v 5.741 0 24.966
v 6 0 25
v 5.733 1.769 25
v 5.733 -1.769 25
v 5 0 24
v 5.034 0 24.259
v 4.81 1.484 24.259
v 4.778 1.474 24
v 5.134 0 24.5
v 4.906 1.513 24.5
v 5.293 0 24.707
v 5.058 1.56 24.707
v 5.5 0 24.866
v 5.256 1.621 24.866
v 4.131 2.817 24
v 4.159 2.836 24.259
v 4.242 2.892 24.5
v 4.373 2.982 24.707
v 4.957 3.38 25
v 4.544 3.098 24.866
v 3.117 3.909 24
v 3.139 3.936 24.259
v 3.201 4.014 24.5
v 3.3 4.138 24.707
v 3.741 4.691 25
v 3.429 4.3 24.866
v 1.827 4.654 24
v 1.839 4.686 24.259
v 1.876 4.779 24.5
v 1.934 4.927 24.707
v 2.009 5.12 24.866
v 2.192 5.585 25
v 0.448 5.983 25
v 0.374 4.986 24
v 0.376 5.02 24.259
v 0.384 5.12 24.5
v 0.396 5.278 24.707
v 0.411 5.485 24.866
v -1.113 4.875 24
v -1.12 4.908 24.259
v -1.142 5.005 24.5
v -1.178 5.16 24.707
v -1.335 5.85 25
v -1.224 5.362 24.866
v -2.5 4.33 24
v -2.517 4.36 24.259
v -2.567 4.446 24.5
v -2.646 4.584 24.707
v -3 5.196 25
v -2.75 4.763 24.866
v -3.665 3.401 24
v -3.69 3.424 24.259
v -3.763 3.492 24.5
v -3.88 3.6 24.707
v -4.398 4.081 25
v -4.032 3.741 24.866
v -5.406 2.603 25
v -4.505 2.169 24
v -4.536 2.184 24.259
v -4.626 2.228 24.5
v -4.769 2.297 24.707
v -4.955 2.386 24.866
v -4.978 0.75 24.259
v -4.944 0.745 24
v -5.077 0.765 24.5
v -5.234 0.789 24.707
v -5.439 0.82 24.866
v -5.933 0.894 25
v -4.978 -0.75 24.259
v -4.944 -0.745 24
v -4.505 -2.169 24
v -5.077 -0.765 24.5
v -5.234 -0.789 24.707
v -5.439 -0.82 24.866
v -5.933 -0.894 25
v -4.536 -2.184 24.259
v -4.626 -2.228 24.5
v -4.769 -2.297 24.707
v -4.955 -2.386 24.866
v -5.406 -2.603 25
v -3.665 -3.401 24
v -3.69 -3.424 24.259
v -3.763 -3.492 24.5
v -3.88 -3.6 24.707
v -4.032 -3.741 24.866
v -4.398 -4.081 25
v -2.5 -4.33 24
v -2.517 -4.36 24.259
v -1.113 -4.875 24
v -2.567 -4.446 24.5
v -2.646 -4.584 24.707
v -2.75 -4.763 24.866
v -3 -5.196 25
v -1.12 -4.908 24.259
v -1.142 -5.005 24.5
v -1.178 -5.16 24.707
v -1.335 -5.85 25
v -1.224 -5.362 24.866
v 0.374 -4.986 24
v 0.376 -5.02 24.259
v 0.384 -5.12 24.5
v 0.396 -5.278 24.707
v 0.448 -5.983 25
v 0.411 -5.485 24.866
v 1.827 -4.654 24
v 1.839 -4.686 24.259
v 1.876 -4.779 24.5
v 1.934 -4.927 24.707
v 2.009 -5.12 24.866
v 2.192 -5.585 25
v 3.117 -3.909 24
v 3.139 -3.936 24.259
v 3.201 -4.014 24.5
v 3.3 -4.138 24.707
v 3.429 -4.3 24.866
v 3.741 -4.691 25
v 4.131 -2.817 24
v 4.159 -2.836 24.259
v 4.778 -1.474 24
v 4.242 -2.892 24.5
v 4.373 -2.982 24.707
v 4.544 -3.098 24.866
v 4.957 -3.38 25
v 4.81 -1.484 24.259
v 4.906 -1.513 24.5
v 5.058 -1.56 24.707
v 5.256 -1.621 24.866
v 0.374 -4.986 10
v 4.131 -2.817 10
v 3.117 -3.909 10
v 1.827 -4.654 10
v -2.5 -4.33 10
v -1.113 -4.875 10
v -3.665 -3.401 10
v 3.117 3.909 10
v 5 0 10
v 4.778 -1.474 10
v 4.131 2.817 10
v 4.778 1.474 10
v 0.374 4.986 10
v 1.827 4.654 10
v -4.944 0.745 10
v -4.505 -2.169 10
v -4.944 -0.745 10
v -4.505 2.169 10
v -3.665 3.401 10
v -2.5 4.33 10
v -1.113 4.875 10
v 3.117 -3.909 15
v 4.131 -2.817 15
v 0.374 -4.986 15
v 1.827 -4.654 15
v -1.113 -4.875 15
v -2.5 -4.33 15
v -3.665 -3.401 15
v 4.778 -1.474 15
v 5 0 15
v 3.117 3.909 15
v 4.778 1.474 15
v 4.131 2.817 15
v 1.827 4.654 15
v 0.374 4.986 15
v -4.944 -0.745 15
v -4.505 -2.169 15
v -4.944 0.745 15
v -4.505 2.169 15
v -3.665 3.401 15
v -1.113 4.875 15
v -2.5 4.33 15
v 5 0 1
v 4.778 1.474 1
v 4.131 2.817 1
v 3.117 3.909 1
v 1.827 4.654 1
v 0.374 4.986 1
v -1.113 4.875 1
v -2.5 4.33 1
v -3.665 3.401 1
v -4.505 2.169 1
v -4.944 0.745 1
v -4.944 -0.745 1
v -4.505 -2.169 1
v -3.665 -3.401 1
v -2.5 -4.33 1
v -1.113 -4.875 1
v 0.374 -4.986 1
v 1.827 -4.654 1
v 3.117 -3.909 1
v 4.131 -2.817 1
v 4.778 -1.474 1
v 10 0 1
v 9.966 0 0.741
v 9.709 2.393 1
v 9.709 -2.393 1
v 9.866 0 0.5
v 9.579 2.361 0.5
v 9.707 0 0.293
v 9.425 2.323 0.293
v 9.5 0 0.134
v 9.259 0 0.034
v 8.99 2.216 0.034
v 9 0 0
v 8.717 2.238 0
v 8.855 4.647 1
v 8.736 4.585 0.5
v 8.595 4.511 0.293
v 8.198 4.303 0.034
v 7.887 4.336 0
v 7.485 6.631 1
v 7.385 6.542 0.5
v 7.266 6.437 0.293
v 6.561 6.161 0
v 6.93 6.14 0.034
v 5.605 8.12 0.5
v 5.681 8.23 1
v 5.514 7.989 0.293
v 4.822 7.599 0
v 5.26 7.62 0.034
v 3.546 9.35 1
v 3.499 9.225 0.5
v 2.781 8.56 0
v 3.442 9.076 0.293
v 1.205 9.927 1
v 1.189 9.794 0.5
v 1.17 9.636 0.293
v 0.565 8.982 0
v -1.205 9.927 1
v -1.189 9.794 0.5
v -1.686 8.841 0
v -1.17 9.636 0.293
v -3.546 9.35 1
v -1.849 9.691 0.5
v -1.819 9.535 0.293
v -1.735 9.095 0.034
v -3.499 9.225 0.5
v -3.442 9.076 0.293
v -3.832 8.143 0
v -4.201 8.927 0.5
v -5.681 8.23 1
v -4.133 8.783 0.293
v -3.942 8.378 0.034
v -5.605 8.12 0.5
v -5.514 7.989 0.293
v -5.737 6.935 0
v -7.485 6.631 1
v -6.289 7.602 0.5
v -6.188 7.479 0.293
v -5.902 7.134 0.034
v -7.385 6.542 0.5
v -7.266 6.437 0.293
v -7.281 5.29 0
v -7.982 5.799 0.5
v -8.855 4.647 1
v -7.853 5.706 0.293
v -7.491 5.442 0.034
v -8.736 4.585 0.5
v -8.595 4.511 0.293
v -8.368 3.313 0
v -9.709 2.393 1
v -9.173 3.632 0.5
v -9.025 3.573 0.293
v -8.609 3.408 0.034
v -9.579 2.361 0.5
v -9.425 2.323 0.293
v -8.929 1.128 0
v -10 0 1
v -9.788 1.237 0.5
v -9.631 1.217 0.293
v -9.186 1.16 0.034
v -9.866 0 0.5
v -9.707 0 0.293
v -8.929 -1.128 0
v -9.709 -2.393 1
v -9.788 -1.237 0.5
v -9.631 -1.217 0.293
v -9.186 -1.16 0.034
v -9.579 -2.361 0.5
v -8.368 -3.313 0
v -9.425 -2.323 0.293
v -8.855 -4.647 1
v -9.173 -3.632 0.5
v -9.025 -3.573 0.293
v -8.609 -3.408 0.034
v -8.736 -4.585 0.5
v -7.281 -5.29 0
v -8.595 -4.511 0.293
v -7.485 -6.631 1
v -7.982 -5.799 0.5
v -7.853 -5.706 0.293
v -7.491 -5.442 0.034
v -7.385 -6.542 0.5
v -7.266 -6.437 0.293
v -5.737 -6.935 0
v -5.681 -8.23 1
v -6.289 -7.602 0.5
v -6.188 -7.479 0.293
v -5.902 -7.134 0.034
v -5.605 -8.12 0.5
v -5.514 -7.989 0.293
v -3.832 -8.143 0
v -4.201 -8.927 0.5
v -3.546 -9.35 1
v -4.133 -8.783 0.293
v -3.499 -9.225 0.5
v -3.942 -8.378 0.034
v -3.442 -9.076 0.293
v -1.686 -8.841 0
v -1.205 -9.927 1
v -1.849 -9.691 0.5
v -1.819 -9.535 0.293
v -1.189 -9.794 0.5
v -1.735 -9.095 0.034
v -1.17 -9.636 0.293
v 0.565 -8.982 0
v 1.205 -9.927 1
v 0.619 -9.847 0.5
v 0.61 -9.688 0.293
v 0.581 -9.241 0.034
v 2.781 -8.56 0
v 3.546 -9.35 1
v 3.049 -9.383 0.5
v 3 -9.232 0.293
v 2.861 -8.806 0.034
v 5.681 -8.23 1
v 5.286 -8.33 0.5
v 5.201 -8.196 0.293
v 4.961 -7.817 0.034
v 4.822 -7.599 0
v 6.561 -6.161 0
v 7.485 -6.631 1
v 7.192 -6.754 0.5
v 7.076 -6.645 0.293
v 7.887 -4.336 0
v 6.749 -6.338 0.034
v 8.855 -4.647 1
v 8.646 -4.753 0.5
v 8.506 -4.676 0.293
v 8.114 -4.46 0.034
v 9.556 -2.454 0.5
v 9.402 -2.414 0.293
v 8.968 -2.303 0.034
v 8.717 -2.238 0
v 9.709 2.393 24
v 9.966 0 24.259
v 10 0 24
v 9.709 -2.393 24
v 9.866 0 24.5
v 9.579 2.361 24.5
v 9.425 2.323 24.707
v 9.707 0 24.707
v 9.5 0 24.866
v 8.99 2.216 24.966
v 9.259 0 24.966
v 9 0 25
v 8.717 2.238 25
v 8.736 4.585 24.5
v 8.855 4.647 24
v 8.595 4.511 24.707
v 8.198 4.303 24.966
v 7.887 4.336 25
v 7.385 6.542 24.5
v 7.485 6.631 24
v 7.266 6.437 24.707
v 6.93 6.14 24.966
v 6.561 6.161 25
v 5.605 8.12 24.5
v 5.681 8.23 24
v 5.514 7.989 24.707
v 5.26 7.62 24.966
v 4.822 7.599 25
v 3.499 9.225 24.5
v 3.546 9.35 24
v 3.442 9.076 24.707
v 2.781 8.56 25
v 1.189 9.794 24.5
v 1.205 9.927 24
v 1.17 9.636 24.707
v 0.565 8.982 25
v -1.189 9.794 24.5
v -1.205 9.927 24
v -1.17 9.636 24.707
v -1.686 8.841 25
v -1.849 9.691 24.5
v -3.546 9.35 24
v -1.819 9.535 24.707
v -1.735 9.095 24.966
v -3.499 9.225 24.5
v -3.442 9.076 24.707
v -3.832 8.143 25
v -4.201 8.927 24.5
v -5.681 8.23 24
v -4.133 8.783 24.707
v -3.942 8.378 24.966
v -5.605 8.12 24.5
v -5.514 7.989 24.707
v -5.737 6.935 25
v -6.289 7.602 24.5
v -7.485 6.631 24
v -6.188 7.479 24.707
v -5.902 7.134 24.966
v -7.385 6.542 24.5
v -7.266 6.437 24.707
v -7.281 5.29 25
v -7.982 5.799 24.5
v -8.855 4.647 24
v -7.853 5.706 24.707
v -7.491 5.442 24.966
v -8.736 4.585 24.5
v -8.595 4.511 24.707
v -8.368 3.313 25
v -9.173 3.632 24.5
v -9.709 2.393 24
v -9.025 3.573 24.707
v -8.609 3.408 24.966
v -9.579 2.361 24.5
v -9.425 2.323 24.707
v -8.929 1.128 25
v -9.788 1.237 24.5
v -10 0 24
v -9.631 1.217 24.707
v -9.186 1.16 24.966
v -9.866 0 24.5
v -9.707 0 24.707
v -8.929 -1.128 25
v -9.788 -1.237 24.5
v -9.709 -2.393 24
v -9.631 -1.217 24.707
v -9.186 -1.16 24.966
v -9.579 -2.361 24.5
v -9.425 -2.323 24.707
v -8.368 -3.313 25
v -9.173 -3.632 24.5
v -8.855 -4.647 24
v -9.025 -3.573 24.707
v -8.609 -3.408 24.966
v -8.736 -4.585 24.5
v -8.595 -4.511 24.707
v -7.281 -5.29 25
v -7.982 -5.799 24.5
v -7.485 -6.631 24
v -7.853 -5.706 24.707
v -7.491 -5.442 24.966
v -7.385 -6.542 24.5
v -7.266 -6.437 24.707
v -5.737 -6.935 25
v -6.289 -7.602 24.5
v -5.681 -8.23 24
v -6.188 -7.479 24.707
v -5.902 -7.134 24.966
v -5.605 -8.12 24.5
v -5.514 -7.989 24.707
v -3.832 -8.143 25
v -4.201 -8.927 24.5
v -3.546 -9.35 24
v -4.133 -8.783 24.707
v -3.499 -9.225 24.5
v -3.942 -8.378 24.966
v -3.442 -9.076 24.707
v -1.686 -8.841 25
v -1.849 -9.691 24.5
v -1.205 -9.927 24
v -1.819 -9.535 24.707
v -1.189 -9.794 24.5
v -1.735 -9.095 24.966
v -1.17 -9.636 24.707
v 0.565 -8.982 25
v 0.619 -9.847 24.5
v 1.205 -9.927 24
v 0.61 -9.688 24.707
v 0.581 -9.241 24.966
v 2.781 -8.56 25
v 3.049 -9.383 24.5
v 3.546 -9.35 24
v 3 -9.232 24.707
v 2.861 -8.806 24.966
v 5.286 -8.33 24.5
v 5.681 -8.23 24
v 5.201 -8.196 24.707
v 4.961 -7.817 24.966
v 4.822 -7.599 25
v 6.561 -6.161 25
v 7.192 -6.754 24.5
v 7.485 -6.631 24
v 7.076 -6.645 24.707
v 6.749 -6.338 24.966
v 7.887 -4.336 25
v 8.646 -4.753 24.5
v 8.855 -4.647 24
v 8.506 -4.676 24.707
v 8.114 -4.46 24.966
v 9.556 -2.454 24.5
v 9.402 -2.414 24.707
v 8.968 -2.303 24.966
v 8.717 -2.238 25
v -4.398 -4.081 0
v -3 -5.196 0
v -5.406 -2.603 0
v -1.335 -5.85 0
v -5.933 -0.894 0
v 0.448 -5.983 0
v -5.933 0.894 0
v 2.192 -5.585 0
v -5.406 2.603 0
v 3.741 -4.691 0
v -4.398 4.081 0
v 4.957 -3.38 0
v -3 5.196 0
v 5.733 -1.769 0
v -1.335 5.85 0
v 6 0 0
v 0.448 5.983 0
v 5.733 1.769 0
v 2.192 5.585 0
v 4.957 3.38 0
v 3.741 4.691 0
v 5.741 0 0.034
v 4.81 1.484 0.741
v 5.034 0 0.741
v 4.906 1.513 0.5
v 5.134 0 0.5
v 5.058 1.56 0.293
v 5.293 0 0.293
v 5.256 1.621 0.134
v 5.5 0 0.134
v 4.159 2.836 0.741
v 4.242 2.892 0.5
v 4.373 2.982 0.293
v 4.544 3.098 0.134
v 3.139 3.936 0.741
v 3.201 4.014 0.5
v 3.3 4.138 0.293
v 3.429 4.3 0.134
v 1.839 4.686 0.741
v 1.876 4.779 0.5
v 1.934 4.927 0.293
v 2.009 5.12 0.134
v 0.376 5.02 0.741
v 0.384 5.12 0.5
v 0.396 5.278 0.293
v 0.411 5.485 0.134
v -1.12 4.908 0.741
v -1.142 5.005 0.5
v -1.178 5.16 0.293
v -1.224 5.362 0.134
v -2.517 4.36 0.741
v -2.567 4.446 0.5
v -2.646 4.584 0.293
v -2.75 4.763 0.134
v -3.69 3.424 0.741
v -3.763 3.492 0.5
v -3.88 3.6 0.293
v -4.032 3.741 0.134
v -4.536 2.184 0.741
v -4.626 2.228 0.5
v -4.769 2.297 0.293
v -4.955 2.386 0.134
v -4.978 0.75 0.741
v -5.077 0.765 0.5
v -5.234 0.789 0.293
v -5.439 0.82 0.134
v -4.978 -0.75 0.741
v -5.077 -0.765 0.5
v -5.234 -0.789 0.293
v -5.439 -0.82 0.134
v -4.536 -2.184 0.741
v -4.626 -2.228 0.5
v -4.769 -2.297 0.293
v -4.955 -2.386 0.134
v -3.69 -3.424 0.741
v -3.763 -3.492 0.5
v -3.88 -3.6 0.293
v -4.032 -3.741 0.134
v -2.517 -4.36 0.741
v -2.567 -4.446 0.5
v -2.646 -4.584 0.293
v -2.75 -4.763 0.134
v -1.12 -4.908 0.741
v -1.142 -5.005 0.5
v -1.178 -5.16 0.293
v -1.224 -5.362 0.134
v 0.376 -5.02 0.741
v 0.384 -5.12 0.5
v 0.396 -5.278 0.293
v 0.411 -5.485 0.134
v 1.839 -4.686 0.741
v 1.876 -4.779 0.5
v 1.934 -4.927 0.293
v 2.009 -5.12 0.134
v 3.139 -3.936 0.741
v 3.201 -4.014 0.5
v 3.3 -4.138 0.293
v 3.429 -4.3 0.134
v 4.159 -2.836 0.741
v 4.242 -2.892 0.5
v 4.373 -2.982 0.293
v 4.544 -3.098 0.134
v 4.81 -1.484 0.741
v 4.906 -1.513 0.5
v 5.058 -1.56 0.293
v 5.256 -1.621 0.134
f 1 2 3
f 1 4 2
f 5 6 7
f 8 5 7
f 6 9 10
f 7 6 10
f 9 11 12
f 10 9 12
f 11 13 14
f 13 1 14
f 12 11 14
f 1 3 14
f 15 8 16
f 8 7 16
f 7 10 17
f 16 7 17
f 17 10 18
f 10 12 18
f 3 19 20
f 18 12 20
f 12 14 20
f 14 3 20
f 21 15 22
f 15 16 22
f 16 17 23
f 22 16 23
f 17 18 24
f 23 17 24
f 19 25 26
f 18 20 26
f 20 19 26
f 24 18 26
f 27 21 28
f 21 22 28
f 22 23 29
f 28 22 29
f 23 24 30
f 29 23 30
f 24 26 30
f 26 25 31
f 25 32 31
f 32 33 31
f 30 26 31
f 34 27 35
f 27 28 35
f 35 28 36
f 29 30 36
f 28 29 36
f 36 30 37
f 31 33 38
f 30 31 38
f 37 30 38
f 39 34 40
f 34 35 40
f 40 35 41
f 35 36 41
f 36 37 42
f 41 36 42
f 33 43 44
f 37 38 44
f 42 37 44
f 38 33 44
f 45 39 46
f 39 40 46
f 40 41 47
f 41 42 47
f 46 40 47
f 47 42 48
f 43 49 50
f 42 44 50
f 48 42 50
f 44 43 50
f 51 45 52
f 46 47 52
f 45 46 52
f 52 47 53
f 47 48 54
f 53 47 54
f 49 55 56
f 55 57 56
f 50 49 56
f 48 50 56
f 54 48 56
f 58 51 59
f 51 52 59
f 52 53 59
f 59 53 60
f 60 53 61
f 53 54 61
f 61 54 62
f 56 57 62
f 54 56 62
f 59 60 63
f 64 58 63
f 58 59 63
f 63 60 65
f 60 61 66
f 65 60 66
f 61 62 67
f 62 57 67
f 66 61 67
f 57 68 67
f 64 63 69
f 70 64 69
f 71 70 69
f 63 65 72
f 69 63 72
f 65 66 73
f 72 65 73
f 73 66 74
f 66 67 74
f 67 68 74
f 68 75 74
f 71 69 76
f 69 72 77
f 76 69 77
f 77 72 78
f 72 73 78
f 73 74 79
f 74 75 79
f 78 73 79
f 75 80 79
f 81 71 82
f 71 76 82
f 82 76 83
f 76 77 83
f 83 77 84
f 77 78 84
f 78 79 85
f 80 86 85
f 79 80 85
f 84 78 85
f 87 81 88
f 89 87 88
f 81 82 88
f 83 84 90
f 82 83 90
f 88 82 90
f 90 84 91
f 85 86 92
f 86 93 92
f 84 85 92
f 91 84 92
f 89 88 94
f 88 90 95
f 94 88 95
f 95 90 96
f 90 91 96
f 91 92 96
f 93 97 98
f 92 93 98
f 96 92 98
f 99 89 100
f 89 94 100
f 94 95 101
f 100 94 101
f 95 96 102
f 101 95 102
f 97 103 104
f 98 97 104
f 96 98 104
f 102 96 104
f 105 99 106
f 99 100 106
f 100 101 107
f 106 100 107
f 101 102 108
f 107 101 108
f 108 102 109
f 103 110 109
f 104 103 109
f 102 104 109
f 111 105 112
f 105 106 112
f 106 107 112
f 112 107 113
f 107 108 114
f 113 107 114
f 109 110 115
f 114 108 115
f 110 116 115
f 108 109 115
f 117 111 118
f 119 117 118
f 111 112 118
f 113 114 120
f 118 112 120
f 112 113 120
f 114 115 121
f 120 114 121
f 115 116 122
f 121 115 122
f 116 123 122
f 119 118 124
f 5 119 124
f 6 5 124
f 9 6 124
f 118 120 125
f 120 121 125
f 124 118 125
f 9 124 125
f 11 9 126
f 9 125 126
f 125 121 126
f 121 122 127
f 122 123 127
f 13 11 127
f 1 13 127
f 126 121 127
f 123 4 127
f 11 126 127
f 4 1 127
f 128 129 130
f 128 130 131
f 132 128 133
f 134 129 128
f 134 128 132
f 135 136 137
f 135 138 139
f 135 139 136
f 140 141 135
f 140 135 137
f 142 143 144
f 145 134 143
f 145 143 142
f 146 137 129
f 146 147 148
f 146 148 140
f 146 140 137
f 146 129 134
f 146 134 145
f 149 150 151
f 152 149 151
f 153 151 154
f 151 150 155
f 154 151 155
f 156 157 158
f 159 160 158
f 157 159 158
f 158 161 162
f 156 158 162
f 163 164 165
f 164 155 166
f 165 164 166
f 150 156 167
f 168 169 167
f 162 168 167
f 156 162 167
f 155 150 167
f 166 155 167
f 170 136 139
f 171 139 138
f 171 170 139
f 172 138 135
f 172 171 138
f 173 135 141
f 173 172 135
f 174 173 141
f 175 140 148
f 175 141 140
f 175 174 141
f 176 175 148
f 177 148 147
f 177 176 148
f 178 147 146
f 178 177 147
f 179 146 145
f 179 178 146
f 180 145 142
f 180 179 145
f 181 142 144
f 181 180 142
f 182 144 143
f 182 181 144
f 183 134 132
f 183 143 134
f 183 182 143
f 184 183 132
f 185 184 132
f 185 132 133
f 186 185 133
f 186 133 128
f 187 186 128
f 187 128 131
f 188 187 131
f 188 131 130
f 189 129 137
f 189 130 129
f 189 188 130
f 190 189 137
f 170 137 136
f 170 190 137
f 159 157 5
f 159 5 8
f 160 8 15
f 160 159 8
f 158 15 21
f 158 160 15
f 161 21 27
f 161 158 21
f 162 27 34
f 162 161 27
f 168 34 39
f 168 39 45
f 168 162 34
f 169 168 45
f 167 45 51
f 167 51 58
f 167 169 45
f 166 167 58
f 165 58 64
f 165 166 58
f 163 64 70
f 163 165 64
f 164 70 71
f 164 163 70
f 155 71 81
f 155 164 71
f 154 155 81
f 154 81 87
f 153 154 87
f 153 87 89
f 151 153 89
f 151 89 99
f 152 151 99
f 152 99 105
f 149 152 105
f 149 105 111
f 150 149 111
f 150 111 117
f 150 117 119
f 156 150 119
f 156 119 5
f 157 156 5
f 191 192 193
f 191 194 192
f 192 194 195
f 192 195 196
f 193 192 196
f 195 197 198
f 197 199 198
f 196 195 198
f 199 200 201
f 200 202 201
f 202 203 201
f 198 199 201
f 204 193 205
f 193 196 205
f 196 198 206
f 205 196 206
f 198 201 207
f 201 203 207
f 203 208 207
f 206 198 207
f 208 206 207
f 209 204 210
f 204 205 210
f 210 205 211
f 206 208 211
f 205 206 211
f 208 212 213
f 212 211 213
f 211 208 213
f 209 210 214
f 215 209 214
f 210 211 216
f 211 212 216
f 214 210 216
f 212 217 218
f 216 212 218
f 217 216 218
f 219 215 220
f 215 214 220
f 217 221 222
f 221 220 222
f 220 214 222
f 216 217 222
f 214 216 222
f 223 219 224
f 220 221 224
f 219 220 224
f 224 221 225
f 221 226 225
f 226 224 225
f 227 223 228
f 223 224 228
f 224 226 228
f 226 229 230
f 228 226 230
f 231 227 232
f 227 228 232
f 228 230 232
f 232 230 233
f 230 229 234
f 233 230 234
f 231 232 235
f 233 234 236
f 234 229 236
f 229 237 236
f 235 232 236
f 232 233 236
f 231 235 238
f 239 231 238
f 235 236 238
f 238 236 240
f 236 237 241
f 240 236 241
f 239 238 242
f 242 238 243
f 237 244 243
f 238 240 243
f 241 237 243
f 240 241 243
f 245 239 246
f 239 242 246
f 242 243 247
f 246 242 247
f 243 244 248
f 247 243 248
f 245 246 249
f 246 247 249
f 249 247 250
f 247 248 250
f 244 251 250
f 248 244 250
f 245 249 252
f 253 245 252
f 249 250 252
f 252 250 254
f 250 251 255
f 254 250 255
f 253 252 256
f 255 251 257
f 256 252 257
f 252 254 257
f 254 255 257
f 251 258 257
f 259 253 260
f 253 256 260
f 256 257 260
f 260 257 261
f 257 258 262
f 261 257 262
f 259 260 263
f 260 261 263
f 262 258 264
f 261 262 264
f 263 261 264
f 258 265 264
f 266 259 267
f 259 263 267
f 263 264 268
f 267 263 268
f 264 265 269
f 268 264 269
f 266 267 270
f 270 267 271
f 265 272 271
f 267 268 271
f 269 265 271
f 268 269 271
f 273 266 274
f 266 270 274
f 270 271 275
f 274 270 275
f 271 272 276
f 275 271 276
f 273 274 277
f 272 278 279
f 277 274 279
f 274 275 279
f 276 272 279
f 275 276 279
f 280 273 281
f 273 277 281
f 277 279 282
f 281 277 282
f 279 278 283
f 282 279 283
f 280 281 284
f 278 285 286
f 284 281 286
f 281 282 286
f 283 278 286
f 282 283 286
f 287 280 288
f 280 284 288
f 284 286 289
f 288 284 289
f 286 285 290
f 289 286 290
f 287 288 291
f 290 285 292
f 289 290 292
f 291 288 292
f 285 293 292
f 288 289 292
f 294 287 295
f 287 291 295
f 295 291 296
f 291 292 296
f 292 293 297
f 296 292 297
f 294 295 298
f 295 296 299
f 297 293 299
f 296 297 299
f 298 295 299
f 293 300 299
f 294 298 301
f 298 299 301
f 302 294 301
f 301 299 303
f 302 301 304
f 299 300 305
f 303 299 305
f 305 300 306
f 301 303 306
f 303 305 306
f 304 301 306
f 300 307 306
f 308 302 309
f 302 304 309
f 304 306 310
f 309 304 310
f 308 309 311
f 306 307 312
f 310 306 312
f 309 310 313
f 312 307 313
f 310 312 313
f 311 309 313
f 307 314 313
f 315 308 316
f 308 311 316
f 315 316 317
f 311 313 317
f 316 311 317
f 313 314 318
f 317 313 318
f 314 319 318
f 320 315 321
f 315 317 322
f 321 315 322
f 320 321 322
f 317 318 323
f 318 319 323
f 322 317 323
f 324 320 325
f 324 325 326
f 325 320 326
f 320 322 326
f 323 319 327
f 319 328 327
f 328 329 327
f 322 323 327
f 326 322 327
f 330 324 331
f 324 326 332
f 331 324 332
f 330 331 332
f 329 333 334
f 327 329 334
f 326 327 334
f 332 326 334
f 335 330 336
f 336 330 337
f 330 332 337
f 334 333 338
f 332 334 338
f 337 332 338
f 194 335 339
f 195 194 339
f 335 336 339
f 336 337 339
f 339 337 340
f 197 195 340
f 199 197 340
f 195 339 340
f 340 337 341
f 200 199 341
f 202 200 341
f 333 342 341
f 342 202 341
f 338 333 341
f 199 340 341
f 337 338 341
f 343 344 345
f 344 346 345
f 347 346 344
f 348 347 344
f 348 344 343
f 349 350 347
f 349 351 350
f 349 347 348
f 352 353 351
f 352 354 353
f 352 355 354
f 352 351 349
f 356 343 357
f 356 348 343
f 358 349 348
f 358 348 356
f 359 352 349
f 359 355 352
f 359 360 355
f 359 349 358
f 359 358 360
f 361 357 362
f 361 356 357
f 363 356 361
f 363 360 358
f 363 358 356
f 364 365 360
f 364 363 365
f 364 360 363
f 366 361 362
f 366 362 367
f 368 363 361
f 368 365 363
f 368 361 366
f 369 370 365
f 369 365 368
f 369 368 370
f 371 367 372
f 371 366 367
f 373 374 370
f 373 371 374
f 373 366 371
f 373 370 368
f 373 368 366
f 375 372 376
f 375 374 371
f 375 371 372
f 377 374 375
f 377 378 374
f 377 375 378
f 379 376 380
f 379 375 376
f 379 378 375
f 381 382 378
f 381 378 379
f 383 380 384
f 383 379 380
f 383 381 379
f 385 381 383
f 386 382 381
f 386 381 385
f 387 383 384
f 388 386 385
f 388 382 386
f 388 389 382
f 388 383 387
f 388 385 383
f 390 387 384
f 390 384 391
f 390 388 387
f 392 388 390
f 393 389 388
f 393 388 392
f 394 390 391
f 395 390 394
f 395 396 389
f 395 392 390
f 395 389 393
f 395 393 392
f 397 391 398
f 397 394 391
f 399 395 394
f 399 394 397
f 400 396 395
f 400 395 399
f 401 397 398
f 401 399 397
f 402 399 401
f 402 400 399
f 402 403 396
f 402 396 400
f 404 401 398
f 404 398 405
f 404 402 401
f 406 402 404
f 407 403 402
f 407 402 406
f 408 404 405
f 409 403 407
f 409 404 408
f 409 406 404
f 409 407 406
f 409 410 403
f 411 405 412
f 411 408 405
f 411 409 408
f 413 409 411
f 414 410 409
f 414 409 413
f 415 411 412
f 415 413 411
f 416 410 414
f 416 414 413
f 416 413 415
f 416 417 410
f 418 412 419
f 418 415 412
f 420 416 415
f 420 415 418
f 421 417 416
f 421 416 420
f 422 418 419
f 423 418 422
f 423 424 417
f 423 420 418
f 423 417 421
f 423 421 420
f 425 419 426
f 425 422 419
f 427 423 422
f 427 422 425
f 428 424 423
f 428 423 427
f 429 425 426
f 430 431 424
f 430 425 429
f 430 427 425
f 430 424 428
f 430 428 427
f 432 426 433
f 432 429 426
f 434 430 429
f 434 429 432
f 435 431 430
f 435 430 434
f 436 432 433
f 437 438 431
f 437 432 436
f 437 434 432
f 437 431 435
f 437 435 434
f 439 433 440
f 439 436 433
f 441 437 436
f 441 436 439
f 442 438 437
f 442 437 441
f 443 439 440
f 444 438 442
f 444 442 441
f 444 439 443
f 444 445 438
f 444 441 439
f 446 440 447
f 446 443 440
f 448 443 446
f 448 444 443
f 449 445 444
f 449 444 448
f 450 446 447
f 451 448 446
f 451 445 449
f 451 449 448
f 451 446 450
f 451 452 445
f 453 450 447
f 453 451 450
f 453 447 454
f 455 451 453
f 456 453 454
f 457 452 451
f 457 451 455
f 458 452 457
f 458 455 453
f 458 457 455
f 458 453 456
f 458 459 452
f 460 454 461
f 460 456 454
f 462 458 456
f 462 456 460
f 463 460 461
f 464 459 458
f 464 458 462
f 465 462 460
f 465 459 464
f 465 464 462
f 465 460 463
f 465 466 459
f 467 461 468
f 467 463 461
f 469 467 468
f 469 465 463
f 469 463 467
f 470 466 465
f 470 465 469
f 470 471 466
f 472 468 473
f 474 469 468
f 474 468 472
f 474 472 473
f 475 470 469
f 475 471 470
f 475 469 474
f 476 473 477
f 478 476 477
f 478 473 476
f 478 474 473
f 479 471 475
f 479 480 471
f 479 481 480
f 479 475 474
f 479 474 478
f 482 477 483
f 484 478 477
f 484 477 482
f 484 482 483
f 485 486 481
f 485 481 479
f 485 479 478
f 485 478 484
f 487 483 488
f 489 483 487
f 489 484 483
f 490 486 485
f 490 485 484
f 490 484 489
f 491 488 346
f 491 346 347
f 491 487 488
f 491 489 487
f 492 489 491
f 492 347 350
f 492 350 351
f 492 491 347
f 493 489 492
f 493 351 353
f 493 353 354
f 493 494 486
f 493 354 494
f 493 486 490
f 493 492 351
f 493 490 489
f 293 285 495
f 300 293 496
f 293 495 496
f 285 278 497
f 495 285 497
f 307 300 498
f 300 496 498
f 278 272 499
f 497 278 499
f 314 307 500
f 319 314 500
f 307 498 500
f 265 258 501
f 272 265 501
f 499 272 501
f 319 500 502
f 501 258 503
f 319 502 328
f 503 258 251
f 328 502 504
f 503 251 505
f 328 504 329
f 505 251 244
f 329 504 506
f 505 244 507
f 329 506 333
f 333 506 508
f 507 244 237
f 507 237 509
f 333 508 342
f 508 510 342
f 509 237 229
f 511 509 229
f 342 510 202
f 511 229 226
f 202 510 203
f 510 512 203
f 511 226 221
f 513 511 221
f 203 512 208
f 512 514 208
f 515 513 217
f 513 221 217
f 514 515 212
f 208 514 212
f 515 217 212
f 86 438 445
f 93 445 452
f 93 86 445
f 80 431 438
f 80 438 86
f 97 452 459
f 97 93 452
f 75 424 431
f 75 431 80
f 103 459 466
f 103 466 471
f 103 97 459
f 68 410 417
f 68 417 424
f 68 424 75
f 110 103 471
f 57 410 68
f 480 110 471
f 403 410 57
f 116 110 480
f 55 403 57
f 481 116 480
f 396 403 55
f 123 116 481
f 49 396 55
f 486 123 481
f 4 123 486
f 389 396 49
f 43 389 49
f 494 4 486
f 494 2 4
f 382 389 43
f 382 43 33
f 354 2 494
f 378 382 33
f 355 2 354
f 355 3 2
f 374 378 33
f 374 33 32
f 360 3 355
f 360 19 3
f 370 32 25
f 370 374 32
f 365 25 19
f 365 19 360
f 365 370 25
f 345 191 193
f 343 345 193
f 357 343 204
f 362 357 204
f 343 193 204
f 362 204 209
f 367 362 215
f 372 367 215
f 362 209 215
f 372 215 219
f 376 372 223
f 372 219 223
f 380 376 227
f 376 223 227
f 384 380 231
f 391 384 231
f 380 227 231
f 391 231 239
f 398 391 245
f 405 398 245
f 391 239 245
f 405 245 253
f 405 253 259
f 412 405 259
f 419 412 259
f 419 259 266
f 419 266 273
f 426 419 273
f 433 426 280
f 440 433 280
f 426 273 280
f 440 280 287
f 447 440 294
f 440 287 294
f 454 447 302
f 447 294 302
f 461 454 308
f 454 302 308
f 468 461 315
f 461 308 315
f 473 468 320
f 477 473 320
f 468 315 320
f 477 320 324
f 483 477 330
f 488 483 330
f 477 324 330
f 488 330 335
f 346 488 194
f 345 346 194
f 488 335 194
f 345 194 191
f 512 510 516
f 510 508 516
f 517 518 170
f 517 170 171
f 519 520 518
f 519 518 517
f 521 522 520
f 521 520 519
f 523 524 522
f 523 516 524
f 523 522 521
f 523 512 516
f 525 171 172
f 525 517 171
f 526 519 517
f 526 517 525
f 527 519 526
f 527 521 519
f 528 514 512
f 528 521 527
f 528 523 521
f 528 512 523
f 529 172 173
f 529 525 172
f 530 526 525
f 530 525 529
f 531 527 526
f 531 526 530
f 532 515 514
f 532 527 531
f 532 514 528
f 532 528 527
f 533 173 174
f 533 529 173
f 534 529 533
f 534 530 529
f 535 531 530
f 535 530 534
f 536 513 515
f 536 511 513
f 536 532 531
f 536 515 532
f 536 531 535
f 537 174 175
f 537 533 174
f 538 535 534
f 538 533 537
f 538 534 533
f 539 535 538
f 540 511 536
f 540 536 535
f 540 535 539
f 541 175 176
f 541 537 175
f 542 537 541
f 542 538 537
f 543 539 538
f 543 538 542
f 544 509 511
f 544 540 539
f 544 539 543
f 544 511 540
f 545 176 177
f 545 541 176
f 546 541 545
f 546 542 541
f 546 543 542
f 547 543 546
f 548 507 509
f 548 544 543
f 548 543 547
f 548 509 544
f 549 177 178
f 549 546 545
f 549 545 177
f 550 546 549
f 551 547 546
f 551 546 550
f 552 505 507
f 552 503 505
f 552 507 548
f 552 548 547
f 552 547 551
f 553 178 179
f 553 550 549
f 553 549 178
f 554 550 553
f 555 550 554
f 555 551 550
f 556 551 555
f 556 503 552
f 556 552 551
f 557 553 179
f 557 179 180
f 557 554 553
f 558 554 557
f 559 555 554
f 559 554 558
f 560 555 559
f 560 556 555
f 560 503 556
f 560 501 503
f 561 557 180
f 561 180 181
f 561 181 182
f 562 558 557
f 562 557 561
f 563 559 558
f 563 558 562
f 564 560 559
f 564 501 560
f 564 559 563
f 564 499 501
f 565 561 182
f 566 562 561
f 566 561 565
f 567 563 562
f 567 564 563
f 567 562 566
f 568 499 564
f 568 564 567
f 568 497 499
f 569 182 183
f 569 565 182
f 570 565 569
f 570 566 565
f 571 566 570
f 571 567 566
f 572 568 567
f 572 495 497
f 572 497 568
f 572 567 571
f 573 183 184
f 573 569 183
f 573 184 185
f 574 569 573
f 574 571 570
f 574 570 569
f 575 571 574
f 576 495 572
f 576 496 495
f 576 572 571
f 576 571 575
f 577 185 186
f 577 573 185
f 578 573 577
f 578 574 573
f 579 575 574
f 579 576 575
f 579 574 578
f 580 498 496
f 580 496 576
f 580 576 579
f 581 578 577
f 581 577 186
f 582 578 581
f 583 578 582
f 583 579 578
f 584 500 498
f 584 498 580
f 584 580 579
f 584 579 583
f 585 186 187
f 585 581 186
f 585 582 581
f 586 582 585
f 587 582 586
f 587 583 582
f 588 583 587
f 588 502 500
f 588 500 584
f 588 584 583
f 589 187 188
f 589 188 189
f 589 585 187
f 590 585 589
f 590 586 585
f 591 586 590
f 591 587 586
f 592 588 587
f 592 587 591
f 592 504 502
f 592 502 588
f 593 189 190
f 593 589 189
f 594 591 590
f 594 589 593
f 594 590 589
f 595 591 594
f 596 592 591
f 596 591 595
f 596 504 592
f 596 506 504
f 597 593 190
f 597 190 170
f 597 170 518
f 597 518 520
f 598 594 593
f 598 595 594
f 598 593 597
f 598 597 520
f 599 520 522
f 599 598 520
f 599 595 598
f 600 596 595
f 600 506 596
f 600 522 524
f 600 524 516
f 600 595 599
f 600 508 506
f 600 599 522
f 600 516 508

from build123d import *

# Parameters (mm, degrees)
SKETCH_1_R      = 10
SKETCH_1_R_2    = 5
EXTRUDE_1_DEPTH = 25
FILLET_1_R      = 1
SKETCH_2_R      = 6.96901779
EXTRUDE_2_DEPTH = 5


with BuildPart() as part:
    # 草图1 → 凸台-拉伸1 (new body)
    with BuildSketch(Plane.XY):
        Circle(SKETCH_1_R)
        Circle(SKETCH_1_R_2, mode=Mode.SUBTRACT)
    extrude(amount=EXTRUDE_1_DEPTH)

    # 圆角1
    fillet_1_edges = [part.edges().sort_by_distance(p)[0] for p in [
        (-10, 0, 0),
        (-10, 0, 25),
        (-5, 0, 0),
        (-5, 0, 25),
    ]]
    fillet(fillet_1_edges, radius=FILLET_1_R)

    # 草图2 → 凸台-拉伸2 (add)
    with BuildSketch(Plane(origin=(0, 0, 10), x_dir=(-1, 0, 0), z_dir=(0, 0, -1))):
        Circle(SKETCH_2_R)
    extrude(amount=-EXTRUDE_2_DEPTH)


solid = part.part
